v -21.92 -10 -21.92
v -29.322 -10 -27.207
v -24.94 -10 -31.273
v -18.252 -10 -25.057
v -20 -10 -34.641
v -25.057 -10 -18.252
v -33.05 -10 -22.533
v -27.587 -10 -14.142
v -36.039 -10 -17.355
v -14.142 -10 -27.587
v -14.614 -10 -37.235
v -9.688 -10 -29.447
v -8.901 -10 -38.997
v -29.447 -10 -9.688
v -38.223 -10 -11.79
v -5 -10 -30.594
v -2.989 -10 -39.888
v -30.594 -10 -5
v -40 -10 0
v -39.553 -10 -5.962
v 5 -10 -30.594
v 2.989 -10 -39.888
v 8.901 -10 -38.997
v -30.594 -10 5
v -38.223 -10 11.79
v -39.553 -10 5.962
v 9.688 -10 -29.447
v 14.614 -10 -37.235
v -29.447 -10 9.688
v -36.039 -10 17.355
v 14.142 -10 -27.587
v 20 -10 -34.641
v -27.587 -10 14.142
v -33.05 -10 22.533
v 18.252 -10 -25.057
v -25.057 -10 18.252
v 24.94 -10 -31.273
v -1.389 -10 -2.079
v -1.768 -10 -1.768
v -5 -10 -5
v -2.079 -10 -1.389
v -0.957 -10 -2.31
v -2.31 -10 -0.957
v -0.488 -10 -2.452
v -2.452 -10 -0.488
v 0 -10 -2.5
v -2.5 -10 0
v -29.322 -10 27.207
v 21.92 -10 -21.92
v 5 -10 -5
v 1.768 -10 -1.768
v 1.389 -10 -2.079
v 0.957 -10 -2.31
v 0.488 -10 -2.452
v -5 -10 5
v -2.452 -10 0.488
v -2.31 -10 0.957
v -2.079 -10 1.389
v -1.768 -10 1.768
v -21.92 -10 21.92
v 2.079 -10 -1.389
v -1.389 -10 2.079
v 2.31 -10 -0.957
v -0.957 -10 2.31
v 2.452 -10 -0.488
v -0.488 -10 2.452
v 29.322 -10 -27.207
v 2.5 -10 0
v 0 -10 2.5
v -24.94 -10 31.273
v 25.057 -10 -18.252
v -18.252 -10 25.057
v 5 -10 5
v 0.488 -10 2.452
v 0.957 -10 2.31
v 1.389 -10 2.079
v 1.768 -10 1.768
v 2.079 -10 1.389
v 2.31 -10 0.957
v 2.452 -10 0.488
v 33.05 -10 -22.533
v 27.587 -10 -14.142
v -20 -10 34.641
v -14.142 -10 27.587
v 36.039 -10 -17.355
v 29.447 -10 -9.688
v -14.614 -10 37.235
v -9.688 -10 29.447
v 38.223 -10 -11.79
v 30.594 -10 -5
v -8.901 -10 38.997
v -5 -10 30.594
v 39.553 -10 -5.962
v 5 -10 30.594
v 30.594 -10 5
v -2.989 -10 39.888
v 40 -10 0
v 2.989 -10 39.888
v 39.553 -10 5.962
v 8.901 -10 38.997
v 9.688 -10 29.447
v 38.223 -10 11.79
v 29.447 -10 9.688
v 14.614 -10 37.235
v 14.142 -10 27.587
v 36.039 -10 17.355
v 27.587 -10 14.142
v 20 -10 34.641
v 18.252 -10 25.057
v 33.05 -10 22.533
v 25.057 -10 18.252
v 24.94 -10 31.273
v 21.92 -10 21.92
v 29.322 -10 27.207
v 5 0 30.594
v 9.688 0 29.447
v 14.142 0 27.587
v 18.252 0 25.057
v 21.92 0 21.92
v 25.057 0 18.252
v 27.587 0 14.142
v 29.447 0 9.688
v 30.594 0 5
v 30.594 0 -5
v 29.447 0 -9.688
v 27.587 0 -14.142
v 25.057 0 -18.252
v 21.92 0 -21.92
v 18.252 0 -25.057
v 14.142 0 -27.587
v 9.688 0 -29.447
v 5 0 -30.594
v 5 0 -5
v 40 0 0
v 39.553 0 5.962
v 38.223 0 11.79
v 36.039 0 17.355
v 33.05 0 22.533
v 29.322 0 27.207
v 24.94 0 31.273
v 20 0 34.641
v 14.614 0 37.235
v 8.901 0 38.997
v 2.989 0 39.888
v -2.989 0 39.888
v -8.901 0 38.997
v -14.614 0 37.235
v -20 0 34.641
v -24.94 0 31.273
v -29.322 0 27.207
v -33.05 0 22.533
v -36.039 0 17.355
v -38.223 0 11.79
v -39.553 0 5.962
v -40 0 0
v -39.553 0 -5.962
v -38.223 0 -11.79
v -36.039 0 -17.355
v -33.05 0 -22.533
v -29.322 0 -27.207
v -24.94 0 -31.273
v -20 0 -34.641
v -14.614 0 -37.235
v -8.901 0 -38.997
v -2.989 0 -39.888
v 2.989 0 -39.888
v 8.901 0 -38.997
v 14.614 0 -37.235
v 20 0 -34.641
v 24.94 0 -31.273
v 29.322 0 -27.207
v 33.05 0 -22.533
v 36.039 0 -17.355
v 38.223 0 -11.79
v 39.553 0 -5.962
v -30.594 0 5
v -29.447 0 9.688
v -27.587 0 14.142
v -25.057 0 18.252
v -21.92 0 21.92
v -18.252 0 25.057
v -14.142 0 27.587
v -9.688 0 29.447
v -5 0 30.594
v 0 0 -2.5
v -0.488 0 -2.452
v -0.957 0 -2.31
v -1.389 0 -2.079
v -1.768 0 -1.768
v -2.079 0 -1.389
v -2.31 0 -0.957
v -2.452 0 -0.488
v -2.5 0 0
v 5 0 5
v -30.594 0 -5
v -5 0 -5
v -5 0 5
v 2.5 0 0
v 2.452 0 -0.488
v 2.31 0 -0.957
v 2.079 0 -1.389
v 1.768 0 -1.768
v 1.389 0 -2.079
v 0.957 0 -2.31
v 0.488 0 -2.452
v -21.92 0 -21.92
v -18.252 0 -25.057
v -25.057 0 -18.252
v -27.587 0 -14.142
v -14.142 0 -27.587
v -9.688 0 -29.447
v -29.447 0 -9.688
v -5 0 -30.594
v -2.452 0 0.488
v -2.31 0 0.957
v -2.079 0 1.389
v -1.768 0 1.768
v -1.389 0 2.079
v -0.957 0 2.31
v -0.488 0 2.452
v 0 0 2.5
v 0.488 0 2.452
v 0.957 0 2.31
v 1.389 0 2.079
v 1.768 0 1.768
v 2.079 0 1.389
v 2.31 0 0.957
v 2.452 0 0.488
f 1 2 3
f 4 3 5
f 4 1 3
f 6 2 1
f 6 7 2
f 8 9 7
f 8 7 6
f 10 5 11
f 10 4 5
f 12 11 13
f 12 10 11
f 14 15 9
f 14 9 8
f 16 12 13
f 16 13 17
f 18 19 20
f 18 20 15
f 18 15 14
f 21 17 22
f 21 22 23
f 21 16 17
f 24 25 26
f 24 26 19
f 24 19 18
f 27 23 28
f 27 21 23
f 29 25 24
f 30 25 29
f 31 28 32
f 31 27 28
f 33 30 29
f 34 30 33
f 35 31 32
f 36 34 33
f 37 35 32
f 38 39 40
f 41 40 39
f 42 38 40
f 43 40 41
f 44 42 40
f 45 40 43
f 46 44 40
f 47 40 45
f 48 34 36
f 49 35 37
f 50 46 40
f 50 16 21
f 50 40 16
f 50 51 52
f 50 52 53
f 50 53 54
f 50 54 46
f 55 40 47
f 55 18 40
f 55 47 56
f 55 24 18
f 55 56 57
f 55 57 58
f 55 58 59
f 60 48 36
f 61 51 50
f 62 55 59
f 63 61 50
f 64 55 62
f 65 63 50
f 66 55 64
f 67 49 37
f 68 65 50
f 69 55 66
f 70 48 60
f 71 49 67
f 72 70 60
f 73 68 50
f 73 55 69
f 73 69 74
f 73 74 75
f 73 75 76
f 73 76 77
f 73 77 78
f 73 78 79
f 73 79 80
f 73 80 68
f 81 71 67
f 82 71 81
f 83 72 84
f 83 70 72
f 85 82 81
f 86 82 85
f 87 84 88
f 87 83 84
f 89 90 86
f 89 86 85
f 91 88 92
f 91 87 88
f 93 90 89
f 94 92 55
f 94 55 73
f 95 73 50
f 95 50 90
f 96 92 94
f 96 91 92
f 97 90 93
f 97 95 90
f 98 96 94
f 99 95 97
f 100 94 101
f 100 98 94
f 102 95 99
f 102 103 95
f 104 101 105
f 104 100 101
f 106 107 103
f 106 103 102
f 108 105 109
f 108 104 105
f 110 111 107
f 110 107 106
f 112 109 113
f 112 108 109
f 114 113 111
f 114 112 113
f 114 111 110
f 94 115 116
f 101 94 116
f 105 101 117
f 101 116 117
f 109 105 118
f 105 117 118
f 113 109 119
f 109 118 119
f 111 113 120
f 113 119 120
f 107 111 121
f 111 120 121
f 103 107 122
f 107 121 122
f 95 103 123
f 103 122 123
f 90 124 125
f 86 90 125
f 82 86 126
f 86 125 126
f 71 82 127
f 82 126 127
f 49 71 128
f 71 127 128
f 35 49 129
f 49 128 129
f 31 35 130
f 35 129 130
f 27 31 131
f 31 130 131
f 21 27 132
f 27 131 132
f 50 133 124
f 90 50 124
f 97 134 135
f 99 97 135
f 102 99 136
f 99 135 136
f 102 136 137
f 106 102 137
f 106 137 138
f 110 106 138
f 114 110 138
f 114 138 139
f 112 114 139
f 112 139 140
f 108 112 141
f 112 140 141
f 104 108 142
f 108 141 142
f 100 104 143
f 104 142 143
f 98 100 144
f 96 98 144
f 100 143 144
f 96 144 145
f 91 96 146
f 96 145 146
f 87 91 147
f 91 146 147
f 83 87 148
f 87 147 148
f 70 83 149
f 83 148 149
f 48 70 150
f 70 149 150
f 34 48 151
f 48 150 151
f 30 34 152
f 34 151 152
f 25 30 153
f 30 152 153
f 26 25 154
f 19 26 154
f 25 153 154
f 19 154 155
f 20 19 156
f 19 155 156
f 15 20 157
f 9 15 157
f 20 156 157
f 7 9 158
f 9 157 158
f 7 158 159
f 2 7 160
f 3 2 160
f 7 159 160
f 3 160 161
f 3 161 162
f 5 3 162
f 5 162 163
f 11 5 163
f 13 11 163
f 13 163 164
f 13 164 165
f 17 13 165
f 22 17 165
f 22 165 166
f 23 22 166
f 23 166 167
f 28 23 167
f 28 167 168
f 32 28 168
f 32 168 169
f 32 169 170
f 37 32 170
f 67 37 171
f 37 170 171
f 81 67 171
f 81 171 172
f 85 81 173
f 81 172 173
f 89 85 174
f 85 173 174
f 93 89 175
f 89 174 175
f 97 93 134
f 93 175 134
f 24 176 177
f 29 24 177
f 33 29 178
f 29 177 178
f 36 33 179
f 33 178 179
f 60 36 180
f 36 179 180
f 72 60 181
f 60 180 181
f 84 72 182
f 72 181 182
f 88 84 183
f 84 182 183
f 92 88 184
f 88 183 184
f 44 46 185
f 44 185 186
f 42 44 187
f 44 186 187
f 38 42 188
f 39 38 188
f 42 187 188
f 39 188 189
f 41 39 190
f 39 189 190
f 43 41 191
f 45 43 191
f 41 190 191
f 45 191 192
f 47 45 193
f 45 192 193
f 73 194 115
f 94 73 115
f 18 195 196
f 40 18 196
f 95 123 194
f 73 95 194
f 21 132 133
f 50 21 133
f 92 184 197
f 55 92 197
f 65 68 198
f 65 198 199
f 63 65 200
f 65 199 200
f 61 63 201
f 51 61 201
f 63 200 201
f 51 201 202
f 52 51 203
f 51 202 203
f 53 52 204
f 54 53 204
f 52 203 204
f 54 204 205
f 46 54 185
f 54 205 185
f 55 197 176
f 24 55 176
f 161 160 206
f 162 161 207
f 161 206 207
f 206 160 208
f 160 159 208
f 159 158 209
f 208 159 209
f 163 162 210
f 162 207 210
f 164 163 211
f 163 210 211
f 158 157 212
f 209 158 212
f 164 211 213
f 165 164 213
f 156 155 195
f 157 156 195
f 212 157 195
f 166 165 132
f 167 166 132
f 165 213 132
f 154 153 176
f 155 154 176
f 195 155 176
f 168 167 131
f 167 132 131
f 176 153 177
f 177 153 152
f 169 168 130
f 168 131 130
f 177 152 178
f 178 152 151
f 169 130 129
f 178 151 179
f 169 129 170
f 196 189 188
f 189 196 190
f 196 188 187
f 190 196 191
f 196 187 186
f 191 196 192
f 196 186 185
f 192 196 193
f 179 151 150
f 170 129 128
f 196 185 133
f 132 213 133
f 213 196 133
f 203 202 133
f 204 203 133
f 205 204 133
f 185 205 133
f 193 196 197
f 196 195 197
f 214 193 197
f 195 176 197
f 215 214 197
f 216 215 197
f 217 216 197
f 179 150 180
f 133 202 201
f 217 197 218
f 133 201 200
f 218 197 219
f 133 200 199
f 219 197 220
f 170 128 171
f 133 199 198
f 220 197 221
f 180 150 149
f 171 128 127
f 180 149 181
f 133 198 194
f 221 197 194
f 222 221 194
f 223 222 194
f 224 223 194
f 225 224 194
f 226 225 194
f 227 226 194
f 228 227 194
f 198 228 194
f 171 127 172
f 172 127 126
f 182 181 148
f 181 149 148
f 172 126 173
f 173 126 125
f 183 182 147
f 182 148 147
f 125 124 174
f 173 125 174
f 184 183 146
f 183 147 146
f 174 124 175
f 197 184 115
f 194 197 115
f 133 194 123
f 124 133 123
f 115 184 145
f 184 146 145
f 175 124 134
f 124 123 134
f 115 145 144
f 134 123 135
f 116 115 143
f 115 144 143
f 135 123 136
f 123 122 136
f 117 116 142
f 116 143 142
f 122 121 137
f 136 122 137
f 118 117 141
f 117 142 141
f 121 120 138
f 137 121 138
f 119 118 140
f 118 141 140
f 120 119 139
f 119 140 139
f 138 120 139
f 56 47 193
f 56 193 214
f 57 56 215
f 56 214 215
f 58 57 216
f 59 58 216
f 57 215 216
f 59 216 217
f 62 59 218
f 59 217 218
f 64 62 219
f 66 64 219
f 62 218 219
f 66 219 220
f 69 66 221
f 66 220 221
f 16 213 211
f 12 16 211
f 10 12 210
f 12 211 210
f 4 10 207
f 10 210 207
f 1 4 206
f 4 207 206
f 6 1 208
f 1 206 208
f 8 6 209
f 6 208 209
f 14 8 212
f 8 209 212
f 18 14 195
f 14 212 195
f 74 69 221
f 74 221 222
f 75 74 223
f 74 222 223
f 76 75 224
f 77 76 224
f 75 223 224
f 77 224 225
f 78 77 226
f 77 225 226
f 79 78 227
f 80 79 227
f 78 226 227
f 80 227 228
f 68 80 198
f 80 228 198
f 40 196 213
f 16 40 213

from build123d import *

# Parameters (mm, degrees)
F0_R     = 40
F1_DEPTH = 10


with BuildPart() as f1:
    # F0 (on Front) → F1 (new body)
    with BuildSketch(Plane.XZ):
        Circle(F0_R)
        with BuildLine():
            Line((-30.594117, -5), (-5, -5))
            Line((-5, -5), (-5, -30.594117))
            ThreePointArc((-5, -30.594117), (-21.92031, -21.92031), (-30.594117, -5))
        make_face(mode=Mode.SUBTRACT)
        with BuildLine():
            Line((5, -30.594117), (5, -5))
            Line((5, -5), (30.594117, -5))
            ThreePointArc((30.594117, -5), (21.92031, -21.92031), (5, -30.594117))
        make_face(mode=Mode.SUBTRACT)
        with BuildLine():
            ThreePointArc((-30.594117, 5), (-21.92031, 21.92031), (-5, 30.594117))
            Line((-5, 30.594117), (-5, 5))
            Line((-5, 5), (-30.594117, 5))
        make_face(mode=Mode.SUBTRACT)
        with BuildLine():
            ThreePointArc((0, 2.5), (1.767767, 1.767767), (2.5, 0))
            ThreePointArc((2.5, 0), (1.767767, -1.767767), (0, -2.5))
            ThreePointArc((0, -2.5), (-1.767767, -1.767767), (-2.5, 0))
            ThreePointArc((-2.5, 0), (-1.767767, 1.767767), (0, 2.5))
        make_face(mode=Mode.SUBTRACT)
        with BuildLine():
            Line((30.594117, 5), (5, 5))
            Line((5, 5), (5, 30.594117))
            ThreePointArc((5, 30.594117), (21.92031, 21.92031), (30.594117, 5))
        make_face(mode=Mode.SUBTRACT)
    extrude(amount=F1_DEPTH)


solid = f1.part
